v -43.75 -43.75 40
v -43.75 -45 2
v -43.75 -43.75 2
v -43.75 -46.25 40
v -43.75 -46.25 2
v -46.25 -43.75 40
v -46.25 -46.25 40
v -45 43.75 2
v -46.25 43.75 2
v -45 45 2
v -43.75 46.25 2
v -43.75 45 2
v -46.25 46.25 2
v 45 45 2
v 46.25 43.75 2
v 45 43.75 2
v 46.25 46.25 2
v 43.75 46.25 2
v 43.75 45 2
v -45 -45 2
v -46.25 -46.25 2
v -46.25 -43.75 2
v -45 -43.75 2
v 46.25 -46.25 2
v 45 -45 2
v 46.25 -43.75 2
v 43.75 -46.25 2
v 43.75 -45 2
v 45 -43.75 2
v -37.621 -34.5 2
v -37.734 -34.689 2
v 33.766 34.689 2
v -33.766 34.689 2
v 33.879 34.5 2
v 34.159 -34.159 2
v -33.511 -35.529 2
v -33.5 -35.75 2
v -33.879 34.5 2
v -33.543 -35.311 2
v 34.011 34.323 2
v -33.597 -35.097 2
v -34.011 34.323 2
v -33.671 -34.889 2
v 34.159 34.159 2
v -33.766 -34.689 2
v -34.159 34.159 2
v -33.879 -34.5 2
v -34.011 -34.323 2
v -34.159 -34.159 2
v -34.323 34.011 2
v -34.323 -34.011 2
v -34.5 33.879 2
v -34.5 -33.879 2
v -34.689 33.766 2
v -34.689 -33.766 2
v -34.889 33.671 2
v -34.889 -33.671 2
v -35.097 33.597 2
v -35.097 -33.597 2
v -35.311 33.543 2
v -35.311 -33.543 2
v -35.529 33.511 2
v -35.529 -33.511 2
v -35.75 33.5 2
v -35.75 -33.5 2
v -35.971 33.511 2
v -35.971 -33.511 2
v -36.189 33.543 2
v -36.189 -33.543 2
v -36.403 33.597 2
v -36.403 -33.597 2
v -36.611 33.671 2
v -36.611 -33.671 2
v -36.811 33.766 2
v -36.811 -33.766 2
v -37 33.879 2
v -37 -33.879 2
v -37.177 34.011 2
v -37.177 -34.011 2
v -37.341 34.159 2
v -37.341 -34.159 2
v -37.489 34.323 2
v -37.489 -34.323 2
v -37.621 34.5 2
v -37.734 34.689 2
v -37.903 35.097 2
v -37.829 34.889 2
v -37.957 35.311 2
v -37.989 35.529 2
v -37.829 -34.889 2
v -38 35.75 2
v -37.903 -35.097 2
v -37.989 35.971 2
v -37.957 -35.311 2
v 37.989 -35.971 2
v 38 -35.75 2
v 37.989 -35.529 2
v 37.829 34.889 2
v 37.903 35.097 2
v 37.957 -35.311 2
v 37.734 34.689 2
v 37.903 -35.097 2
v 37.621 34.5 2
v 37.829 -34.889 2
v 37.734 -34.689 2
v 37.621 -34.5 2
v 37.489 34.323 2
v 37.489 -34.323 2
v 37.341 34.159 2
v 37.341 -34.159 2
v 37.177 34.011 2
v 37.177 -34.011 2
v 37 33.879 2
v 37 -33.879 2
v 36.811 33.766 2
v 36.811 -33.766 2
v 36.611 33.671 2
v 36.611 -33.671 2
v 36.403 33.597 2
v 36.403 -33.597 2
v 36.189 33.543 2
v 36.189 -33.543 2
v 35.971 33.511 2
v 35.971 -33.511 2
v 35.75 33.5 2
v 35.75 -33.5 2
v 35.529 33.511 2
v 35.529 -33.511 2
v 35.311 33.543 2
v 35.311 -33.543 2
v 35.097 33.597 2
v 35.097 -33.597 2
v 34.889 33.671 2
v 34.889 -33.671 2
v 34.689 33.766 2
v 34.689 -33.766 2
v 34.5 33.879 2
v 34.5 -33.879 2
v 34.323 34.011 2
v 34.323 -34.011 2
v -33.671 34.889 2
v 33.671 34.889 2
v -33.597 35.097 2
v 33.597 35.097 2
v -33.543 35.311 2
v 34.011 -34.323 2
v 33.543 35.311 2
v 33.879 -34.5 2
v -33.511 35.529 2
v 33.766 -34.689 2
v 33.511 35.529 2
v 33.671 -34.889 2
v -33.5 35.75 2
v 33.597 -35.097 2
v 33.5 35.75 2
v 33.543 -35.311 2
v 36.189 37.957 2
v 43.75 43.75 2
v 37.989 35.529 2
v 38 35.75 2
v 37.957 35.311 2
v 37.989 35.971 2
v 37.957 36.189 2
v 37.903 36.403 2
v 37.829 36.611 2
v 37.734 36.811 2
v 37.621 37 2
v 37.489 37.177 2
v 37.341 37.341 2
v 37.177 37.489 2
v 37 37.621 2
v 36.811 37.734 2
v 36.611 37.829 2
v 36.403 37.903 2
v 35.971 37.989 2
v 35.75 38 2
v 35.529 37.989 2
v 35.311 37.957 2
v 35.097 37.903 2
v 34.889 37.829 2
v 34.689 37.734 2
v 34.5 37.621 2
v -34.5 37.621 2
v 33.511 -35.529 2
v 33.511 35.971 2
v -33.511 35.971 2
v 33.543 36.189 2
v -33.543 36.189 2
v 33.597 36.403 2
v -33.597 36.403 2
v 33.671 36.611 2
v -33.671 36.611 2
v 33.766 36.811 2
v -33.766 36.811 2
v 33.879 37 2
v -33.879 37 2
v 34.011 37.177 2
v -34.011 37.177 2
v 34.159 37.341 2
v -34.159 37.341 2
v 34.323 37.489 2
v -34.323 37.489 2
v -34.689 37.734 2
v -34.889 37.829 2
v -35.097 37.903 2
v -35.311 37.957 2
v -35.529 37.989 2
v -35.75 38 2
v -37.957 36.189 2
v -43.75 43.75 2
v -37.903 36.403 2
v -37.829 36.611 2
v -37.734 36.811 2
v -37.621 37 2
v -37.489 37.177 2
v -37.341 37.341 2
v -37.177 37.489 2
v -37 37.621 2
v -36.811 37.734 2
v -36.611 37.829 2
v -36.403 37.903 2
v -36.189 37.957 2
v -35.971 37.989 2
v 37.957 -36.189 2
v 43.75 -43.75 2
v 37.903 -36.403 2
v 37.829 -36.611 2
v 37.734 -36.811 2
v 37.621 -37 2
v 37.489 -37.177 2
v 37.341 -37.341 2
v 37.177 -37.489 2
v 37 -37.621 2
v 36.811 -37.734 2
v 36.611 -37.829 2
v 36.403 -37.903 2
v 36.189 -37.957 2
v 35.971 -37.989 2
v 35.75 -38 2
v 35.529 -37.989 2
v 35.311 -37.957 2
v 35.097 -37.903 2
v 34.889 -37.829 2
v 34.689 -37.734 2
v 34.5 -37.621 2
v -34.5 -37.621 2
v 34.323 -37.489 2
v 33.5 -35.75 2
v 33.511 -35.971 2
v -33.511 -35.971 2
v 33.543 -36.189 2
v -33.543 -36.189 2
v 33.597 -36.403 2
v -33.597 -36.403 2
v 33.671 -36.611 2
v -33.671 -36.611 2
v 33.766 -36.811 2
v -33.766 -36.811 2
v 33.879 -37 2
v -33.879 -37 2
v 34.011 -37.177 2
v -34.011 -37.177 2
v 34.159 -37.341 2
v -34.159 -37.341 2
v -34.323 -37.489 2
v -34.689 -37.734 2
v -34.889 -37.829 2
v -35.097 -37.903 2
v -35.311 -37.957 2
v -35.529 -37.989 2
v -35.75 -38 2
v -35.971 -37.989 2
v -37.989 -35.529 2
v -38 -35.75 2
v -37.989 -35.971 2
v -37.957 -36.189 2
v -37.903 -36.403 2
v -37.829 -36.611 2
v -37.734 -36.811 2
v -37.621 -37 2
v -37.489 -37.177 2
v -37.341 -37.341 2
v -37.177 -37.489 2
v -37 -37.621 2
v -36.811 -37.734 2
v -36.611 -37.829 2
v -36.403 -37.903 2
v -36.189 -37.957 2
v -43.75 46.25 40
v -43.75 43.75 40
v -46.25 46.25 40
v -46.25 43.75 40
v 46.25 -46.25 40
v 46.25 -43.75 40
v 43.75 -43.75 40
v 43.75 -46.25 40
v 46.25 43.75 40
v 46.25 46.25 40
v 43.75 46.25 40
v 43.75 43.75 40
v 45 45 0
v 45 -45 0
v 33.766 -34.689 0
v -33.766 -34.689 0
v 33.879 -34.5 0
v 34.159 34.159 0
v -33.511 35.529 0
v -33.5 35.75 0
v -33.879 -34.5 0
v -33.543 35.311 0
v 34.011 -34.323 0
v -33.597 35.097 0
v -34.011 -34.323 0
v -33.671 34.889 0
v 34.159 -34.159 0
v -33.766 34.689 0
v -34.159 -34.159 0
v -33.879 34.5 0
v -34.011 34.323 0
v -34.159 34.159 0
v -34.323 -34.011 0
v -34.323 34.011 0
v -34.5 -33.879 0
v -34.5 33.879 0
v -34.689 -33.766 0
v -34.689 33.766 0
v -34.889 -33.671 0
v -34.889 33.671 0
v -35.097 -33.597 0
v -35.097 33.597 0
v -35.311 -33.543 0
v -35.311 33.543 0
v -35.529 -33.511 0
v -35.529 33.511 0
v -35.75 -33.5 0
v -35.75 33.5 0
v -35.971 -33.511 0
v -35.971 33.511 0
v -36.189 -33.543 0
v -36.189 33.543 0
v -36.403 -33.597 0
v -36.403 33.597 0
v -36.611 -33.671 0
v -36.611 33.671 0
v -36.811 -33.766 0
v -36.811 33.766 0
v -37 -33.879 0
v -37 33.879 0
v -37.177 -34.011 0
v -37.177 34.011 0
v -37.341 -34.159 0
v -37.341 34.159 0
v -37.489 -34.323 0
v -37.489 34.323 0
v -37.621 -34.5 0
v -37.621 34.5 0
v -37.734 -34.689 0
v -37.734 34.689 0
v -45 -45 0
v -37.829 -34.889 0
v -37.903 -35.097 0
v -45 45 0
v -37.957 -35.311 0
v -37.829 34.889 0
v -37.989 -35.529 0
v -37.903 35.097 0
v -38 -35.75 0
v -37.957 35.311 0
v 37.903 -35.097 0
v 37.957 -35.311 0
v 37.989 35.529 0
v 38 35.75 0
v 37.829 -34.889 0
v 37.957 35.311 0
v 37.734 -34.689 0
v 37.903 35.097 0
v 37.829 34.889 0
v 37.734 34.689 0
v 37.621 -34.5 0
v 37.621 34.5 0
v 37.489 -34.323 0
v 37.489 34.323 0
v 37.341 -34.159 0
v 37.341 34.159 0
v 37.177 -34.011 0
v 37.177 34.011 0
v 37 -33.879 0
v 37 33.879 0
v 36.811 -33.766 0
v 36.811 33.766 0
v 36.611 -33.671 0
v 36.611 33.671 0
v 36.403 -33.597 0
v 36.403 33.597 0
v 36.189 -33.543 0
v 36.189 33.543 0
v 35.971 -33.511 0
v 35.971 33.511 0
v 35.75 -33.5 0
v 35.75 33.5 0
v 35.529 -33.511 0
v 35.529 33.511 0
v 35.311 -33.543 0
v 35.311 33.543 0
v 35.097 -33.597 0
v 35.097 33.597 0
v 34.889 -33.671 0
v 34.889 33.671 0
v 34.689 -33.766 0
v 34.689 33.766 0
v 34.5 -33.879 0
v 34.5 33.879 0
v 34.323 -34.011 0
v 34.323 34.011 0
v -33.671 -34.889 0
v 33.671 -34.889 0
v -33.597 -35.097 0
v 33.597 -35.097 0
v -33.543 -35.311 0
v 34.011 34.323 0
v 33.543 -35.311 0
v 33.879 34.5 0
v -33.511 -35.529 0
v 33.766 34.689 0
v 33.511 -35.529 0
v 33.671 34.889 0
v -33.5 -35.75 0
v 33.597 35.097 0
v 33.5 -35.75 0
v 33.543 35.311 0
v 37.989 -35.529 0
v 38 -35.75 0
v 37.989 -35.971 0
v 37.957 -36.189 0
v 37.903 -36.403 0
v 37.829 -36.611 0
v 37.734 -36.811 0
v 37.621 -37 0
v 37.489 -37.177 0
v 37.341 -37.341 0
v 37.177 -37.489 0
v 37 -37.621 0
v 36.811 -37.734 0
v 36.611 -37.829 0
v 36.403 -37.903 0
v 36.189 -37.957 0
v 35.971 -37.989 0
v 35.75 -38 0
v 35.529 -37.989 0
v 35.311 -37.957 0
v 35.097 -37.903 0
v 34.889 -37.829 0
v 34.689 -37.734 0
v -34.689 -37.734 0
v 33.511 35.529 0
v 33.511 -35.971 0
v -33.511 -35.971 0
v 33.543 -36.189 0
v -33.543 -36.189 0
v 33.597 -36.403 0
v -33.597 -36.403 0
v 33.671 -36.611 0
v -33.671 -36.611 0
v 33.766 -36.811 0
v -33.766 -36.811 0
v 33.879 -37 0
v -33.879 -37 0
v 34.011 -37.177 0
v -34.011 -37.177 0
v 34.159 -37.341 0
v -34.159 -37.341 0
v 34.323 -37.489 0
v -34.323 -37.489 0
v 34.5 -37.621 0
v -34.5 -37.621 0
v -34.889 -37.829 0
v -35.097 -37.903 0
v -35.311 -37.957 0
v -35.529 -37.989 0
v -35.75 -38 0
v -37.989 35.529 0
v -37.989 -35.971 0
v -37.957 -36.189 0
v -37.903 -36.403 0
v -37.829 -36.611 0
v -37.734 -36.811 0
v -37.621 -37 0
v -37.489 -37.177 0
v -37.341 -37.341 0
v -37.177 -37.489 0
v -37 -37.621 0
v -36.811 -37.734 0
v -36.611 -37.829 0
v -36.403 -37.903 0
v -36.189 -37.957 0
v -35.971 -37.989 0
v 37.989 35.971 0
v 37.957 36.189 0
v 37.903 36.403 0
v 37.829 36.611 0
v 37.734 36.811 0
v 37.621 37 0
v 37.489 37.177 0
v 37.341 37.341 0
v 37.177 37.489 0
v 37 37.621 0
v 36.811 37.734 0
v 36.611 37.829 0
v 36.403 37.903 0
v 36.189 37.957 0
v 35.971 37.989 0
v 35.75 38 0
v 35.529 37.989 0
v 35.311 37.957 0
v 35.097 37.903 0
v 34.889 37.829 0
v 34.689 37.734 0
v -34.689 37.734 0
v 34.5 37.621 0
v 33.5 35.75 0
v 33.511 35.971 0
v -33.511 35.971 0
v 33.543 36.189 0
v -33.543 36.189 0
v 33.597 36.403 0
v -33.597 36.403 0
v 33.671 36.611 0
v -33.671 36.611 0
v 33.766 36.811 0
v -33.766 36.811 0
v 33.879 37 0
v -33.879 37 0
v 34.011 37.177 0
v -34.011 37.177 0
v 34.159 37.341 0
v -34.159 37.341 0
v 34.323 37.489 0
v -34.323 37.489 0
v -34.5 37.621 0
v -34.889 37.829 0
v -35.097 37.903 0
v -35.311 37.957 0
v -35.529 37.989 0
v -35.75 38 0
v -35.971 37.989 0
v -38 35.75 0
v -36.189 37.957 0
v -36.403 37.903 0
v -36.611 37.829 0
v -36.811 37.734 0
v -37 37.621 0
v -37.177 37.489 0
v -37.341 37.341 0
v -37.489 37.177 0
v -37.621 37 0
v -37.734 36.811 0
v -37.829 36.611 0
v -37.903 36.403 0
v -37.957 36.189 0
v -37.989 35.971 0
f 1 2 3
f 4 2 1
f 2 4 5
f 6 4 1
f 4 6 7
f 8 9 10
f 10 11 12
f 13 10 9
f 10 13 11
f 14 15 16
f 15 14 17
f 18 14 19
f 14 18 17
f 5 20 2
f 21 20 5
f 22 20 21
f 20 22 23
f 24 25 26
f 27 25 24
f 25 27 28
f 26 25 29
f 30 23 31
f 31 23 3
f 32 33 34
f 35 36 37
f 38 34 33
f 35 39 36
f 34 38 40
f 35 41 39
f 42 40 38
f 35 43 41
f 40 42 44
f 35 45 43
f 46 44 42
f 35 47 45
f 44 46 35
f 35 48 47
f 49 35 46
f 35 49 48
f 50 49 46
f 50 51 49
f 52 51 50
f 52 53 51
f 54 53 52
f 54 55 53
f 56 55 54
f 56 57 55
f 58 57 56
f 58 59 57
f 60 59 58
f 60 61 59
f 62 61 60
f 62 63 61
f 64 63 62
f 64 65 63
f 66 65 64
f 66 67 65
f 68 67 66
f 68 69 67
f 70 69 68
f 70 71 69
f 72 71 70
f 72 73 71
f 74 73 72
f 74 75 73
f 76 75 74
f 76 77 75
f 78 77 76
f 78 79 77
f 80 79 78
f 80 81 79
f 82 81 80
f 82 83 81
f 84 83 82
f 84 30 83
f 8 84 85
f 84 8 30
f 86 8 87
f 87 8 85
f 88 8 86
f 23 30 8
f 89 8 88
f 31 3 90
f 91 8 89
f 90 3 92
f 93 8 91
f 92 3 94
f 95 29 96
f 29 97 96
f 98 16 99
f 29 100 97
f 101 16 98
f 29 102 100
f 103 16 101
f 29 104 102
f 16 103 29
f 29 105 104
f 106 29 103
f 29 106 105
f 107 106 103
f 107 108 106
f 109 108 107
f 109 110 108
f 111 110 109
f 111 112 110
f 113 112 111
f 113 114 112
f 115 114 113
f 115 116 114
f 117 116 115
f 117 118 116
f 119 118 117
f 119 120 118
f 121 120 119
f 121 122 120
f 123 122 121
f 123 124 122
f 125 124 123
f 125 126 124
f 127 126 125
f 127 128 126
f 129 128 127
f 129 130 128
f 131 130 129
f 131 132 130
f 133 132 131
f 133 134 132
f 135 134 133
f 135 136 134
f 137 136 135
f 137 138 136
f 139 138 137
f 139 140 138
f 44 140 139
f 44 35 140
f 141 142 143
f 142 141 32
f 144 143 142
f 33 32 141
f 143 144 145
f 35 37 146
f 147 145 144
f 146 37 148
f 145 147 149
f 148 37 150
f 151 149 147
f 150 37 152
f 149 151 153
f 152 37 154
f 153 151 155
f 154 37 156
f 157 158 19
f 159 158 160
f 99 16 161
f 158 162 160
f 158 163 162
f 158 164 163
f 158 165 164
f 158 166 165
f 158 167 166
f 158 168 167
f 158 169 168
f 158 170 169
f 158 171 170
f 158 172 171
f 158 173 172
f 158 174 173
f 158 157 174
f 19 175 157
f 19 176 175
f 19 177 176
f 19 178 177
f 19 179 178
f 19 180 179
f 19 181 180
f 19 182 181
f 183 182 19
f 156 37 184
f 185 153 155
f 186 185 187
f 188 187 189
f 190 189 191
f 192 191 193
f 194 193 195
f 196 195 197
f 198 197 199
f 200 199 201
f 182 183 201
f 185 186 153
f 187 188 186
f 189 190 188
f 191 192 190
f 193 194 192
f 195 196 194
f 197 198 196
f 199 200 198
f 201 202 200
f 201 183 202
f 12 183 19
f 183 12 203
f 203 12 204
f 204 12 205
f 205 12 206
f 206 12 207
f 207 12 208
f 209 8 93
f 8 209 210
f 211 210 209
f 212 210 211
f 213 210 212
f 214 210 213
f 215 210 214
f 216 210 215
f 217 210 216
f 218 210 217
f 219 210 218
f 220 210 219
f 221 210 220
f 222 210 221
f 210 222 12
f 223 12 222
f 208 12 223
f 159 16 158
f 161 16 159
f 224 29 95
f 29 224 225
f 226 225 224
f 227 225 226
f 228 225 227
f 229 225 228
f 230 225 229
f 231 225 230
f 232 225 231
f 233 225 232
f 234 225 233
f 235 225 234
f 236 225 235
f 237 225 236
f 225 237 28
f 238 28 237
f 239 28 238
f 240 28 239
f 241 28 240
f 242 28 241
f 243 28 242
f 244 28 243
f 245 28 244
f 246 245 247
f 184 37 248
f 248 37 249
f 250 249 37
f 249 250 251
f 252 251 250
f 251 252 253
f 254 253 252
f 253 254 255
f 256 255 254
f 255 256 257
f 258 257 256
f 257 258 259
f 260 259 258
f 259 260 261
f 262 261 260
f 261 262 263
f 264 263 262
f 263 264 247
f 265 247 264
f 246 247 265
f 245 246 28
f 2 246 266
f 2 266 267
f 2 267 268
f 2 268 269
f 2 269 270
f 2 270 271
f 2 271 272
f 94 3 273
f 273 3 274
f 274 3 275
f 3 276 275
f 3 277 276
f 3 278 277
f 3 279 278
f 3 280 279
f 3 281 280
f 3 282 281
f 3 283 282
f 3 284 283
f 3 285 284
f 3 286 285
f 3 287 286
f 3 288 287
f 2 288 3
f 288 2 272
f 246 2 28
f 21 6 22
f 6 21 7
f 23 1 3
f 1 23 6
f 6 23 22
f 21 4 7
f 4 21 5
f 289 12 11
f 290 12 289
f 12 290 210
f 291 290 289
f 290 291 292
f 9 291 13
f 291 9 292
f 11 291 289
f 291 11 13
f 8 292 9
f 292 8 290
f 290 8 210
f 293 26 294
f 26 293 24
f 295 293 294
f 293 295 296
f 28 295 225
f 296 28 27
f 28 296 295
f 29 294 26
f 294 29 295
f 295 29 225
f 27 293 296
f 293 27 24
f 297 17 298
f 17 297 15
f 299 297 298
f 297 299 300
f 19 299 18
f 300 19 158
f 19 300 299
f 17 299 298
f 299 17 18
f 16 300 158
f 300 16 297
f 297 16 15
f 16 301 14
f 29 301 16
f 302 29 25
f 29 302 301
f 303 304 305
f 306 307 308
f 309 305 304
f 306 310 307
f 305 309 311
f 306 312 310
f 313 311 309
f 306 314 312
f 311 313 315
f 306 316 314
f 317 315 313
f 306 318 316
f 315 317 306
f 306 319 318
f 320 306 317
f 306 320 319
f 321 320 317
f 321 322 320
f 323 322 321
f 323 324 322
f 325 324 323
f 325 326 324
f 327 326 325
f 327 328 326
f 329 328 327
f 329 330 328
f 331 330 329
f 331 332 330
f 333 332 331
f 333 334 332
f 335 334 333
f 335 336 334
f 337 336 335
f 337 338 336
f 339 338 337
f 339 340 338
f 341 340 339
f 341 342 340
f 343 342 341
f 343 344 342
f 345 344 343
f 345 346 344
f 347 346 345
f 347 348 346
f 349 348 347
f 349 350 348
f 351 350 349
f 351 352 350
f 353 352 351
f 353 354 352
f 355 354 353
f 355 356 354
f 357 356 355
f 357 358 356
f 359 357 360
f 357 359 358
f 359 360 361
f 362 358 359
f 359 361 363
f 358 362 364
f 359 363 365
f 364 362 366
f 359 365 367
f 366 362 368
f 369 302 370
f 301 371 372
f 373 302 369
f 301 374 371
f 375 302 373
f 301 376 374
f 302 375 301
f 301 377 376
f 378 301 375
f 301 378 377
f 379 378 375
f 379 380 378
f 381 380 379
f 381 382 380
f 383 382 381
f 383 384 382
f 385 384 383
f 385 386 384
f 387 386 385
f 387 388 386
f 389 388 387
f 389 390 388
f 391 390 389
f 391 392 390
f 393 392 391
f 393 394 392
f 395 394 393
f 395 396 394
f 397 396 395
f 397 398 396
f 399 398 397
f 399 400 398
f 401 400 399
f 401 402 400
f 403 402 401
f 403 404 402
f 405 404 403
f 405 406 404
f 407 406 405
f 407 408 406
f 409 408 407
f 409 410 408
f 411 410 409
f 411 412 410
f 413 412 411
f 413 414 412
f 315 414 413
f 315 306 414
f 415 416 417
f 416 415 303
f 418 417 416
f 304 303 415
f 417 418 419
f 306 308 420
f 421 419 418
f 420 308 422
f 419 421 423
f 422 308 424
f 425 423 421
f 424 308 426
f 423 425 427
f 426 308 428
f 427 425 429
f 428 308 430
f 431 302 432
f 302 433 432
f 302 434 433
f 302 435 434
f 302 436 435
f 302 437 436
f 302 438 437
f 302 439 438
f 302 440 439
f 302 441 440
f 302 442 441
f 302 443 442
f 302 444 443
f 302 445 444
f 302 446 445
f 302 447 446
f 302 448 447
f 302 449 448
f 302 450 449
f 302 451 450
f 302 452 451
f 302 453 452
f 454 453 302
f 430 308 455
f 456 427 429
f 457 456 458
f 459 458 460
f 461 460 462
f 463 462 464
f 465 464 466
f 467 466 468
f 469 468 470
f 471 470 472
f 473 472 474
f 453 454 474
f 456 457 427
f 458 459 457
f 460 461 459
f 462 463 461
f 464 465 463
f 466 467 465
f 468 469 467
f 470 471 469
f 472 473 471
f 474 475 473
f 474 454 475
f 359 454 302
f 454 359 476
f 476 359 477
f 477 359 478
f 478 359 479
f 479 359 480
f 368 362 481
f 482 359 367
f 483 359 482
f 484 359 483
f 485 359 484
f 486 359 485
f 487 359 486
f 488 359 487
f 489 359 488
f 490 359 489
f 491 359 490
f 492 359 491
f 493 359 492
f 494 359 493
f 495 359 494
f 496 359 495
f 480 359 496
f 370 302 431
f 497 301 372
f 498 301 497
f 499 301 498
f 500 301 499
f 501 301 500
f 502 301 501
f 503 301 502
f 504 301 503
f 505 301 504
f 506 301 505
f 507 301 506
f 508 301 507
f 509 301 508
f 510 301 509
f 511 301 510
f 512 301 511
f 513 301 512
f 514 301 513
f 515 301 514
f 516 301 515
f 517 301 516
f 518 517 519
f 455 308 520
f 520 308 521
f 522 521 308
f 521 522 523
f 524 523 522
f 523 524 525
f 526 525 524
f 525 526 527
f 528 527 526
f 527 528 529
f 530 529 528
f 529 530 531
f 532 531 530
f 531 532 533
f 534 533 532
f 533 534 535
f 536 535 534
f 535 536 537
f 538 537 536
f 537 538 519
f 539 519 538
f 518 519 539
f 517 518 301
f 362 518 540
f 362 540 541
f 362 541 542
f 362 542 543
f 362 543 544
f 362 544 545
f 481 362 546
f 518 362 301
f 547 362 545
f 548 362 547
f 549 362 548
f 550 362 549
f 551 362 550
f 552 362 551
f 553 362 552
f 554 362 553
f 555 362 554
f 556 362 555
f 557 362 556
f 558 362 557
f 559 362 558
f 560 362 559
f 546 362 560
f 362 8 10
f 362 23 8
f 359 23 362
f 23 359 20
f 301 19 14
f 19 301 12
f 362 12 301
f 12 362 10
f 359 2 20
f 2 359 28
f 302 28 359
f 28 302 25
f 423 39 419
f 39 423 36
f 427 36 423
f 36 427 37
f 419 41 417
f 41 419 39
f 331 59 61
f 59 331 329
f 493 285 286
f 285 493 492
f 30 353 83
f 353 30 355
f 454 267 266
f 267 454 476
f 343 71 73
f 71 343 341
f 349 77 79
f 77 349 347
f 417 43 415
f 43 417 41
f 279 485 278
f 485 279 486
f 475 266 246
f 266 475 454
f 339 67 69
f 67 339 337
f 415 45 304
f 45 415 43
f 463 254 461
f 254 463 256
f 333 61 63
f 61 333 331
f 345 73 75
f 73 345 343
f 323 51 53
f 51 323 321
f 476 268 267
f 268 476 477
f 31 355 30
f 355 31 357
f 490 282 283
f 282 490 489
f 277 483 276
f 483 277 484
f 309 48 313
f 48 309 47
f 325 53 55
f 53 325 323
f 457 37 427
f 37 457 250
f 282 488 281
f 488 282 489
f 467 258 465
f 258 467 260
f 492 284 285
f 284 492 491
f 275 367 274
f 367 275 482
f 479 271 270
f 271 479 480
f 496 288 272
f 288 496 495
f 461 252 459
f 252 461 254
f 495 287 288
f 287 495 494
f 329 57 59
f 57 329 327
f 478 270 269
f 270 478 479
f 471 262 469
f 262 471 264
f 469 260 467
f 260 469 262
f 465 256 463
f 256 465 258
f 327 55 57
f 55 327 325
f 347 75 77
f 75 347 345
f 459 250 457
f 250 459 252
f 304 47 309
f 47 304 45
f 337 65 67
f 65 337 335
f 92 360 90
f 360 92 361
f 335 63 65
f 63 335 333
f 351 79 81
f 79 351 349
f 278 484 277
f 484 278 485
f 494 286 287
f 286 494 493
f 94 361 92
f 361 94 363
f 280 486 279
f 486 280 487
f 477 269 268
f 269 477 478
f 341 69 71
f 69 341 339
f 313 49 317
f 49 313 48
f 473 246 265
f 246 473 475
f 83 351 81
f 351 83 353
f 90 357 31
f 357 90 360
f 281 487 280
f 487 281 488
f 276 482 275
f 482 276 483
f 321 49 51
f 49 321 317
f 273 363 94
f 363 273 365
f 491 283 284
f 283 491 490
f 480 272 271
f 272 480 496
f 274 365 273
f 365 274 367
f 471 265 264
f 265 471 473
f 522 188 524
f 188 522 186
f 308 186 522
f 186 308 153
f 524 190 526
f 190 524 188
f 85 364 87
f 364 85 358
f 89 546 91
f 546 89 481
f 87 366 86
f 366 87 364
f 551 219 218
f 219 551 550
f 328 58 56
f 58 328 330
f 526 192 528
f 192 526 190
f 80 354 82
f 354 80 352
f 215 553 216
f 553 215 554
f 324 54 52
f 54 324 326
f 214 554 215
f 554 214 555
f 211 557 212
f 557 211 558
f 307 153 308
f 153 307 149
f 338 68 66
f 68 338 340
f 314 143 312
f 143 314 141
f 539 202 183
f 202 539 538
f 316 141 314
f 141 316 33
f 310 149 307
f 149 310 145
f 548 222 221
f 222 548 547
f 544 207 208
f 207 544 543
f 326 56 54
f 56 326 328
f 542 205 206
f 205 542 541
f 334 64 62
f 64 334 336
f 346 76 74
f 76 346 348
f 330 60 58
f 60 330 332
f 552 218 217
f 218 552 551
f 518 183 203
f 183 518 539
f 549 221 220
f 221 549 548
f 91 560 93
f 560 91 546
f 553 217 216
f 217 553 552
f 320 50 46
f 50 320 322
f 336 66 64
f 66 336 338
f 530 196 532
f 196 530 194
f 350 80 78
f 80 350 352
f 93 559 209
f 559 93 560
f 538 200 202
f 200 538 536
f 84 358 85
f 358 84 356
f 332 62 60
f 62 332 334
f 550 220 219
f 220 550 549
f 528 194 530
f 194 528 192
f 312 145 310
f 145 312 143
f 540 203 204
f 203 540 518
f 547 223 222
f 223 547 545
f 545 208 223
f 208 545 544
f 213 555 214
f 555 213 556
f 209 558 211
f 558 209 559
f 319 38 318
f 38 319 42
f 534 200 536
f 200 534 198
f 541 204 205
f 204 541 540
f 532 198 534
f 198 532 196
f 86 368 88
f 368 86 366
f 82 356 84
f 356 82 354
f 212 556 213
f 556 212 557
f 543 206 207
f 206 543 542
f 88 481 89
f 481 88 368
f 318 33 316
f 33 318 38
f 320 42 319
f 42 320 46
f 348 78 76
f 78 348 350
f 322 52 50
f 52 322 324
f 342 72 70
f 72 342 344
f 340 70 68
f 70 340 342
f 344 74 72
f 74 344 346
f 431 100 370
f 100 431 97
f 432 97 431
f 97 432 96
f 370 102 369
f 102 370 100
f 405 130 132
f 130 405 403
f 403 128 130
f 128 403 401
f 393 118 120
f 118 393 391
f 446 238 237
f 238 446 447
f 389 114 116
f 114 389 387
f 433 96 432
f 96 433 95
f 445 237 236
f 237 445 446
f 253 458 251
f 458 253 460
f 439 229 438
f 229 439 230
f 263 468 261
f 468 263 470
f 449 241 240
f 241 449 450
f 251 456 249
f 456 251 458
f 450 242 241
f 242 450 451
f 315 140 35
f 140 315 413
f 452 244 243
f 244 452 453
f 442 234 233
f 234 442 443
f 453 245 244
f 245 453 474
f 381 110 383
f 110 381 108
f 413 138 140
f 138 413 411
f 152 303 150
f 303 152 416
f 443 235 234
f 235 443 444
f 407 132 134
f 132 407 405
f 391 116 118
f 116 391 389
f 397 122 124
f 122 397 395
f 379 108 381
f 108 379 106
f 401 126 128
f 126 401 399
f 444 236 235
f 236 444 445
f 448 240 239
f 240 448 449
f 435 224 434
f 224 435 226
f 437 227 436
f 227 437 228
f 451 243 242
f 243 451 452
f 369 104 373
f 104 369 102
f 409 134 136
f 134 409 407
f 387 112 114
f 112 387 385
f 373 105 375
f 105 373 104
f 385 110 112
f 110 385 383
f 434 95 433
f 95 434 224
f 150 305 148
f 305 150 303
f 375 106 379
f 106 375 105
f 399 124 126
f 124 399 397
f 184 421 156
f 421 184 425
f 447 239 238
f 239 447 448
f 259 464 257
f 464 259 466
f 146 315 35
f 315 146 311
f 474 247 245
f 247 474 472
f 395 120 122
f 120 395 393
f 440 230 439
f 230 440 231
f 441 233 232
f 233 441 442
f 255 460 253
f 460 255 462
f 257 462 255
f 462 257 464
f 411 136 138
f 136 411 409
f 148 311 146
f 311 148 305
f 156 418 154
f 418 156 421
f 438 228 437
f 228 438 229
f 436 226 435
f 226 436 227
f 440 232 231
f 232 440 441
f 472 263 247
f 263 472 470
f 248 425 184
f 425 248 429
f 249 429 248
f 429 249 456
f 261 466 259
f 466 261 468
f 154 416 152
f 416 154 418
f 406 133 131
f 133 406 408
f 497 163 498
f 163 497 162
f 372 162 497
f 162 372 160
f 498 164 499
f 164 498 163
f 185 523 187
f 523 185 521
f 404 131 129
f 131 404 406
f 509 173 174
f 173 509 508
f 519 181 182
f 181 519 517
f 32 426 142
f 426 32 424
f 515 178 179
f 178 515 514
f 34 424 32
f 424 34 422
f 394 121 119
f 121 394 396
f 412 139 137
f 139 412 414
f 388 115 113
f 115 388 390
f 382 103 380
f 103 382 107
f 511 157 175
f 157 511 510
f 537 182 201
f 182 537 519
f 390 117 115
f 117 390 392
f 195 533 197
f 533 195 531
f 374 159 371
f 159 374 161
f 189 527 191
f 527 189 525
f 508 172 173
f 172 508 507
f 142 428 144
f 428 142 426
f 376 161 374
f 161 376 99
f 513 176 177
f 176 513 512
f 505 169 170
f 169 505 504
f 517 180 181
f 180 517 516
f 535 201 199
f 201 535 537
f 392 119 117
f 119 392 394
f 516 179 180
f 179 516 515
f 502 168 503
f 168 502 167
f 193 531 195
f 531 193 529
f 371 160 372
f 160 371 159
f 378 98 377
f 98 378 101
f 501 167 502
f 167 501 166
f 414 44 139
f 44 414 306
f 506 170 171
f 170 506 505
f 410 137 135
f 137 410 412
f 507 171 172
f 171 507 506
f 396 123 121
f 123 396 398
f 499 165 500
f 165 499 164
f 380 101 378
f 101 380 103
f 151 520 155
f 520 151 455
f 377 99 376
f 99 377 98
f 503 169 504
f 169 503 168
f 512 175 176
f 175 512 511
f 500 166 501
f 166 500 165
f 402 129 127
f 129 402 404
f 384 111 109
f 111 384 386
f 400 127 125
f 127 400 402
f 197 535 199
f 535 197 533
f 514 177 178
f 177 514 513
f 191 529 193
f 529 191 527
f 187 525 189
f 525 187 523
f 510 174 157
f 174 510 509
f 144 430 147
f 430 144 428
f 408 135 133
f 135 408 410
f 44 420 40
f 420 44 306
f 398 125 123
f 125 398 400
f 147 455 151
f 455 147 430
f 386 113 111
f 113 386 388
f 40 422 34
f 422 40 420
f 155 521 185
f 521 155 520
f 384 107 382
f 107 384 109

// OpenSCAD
// DIY magnetic stirrer housing - print orientation (upside down)
// Units: mm

// ---------- Parameters ----------
top_thickness      = 2;     // top plate thickness (z = 0 to 2)
wall_thickness     = 2.5;   // wall thickness
box_height         = 40;    // total height of box (open at top)
outer_size         = 90;    // outer X and Y size of box
screw_hole_d       = 4.5;   // M4 screw hole diameter
screw_hole_pitch   = 71.5;  // square pattern pitch for screw holes
cable_notch_w      = 12;    // cable notch width
cable_notch_depth  = 8;     // cable notch depth from open edge
eps                = 0.5;   // cutter overshoot past faces

$fn = 64;

// ---------- Model ----------
difference() {
    union() {
        // Top plate (lies on bed)
        translate([-outer_size/2, -outer_size/2, 0])
            cube([outer_size, outer_size, top_thickness]);

        // Four walls rising from plate to open top
        for (x = [-outer_size/2, outer_size/2])
            for (y = [-outer_size/2, outer_size/2])
                translate([x - wall_thickness/2, y - wall_thickness/2, top_thickness])
                    cube([wall_thickness, wall_thickness, box_height - top_thickness]);
    }

    // Four M4 screw holes through top plate, centred square pattern
    for (x = [-screw_hole_pitch/2, screw_hole_pitch/2])
        for (y = [-screw_hole_pitch/2, screw_hole_pitch/2])
            translate([x, y, -eps])
                cylinder(d = screw_hole_d, h = top_thickness + 2*eps);

    // Cable notch in one wall: 12 mm wide, centred along wall,
    // reaches 8 mm down from open edge (z = 32 to z = 40)
    translate([-outer_size/2 - wall_thickness/2, 0, box_height - cable_notch_depth])
        cube([wall_thickness + eps, cable_notch_w + eps, cable_notch_depth]);
}
